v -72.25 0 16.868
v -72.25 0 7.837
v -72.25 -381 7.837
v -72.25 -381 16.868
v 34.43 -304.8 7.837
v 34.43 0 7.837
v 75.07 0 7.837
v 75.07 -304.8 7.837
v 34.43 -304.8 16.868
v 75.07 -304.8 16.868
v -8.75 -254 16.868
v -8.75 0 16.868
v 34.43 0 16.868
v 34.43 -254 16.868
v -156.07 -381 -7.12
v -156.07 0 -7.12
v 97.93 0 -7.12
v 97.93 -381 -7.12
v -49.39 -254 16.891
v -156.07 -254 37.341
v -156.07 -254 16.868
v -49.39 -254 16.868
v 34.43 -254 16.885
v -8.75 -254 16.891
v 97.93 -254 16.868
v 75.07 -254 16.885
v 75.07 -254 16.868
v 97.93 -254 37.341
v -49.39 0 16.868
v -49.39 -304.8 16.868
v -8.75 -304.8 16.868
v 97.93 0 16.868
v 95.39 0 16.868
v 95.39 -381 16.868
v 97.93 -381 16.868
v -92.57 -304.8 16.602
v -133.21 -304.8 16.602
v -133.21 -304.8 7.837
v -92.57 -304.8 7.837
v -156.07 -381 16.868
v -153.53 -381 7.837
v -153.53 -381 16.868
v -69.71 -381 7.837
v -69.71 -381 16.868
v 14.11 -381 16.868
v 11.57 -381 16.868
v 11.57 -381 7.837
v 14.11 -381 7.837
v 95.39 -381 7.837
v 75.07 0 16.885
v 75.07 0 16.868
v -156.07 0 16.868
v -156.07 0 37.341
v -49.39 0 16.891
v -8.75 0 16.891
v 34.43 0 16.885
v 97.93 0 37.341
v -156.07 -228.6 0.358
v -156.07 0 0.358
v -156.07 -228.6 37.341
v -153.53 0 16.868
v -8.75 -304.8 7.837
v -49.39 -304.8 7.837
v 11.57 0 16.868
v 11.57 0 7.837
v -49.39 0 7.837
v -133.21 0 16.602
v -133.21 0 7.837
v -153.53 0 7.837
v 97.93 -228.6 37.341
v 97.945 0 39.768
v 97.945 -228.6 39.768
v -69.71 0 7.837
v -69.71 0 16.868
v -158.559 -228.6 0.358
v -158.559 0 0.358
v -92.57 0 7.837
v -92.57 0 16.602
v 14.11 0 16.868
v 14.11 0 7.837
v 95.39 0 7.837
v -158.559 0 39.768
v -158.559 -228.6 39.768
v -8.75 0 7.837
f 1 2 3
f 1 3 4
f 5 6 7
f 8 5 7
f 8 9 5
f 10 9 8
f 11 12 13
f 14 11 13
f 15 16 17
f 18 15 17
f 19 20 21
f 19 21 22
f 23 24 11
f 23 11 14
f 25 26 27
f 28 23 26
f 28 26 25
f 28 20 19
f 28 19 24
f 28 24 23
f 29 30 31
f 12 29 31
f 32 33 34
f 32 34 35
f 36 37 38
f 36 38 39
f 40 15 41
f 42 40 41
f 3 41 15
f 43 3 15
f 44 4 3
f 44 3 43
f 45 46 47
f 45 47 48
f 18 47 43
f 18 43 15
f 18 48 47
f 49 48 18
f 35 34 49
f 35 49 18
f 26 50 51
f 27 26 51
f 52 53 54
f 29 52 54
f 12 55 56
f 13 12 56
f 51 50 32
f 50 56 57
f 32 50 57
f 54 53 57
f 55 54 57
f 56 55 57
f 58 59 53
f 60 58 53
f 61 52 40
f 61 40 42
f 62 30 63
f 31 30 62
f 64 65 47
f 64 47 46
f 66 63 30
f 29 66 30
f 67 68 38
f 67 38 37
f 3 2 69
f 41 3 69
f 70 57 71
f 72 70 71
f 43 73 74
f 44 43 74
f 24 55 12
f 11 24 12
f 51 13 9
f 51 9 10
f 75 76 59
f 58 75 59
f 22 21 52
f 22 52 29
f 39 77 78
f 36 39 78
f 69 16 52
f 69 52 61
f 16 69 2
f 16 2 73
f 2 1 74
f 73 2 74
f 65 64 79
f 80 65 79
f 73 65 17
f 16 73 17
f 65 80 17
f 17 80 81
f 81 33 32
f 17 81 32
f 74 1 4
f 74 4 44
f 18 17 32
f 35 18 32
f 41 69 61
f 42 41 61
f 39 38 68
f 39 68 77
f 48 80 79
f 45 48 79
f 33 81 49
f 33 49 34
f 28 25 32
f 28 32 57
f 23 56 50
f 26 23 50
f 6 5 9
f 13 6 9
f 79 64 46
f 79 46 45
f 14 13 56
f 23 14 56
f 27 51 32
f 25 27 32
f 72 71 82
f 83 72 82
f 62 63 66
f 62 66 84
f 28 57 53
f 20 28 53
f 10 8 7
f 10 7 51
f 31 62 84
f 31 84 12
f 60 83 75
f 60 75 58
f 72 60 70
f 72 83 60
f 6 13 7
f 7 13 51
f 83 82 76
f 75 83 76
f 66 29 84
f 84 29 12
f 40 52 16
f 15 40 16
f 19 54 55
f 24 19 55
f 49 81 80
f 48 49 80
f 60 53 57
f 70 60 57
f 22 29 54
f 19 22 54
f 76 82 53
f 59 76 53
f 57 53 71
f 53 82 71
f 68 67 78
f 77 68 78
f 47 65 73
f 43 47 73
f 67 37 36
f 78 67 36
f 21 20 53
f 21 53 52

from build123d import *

# Parameters (mm, degrees)
F0_W     = 2.54
F0_H     = 9.0310877802
F1_DEPTH = 381
F0_W_2   = 40.64
F0_H_2   = 8.7648493582
F2_DEPTH = 304.8
F3_DEPTH = 254
F4_DEPTH = 228.6


with BuildPart() as f1:
    # F0 (on Front) → F1 (new body)
    with BuildSketch(Plane.XZ):
        Polygon((-153.5303335104, 7.8373091883), (-156.0703335104, 7.8373091883), (-156.0703335104, 0.3584396719), (-156.0703335104, -7.1204298445), (97.9296664896, -7.1204298445), (97.9296664896, 7.8373091883), (95.3896664896, 7.8373091883), (75.0696594866, 7.8373091883), (34.4296594866, 7.8373091883), (14.1096664896, 7.8373091883), (11.5696664896, 7.8373091883), (-8.7503335104, 7.8373091883), (-49.3903335104, 7.8373091883), (-69.7103335104, 7.8373091883), (-72.2503335104, 7.8373091883), (-92.5703335104, 7.8373091883), (-133.2103335104, 7.8373091883), align=None)
        with Locations((-154.8003335104, 12.3528530784)):
            Rectangle(F0_W, F0_H)
        with Locations((-70.9803335104, 12.3528530784)):
            Rectangle(F0_W, F0_H)
        with Locations((12.8396664896, 12.3528530784)):
            Rectangle(F0_W, F0_H)
        with Locations((96.6596664896, 12.3528530784)):
            Rectangle(F0_W, F0_H)
    extrude(amount=F1_DEPTH)


with BuildPart() as f2:
    # F0 (on Front) → F2 (new body)
    with BuildSketch(Plane.XZ):
        with Locations((-112.8903335104, 12.2197338674)):
            Rectangle(F0_W_2, F0_H_2)
    extrude(amount=F2_DEPTH)


with BuildPart() as f2b:
    # F0 (on Front) → F2, piece 2 (new body)
    with BuildSketch(Plane.XZ):
        with Locations((-29.0703335104, 12.3528530784)):
            Rectangle(F0_W_2, F0_H)
    extrude(amount=F2_DEPTH)


with BuildPart() as f2c:
    # F0 (on Front) → F2, piece 3 (new body)
    with BuildSketch(Plane.XZ):
        with Locations((54.7496594866, 12.3528530784)):
            Rectangle(F0_W_2, F0_H)
    extrude(amount=F2_DEPTH)


with BuildPart() as f3:
    # F0 (on Front) → F3 (new body)
    with BuildSketch(Plane.XZ):
        Polygon((-156.0703335104, 37.3410619795), (-156.0703335104, 16.8683969685), (-153.5303335104, 16.8683969685), (-72.2503335104, 16.8683969685), (-69.7103335104, 16.8683969685), (-49.3903335104, 16.8683969685), (-49.3903335104, 16.8913751841), (-8.7503335104, 16.8913751841), (-8.7503335104, 16.8683969685), (11.5696664896, 16.8683969685), (14.1096664896, 16.8683969685), (34.4296594866, 16.8683969685), (34.4296594866, 16.8852672009), (75.0696594866, 16.8852672009), (75.0696594866, 16.8683969685), (95.3896664896, 16.8683969685), (97.9296664896, 16.8683969685), (97.9296664896, 37.3410619795), align=None)
    extrude(amount=F3_DEPTH)


with BuildPart() as f4:
    # F0 (on Front) → F4 (new body)
    with BuildSketch(Plane.XZ):
        Polygon((-156.0703335104, 0.3584396719), (-156.0703335104, 7.8373091883), (-156.0703335104, 16.8683969685), (-156.0703335104, 37.3410619795), (97.9296664896, 37.3410619795), (97.9446843266, 39.7676415741), (-158.5593819618, 39.7676415741), (-158.5593819618, 0.3584396719), align=None)
    extrude(amount=F4_DEPTH)


solid = Compound([f1.part, f2.part, f2b.part, f2c.part, f3.part, f4.part])
